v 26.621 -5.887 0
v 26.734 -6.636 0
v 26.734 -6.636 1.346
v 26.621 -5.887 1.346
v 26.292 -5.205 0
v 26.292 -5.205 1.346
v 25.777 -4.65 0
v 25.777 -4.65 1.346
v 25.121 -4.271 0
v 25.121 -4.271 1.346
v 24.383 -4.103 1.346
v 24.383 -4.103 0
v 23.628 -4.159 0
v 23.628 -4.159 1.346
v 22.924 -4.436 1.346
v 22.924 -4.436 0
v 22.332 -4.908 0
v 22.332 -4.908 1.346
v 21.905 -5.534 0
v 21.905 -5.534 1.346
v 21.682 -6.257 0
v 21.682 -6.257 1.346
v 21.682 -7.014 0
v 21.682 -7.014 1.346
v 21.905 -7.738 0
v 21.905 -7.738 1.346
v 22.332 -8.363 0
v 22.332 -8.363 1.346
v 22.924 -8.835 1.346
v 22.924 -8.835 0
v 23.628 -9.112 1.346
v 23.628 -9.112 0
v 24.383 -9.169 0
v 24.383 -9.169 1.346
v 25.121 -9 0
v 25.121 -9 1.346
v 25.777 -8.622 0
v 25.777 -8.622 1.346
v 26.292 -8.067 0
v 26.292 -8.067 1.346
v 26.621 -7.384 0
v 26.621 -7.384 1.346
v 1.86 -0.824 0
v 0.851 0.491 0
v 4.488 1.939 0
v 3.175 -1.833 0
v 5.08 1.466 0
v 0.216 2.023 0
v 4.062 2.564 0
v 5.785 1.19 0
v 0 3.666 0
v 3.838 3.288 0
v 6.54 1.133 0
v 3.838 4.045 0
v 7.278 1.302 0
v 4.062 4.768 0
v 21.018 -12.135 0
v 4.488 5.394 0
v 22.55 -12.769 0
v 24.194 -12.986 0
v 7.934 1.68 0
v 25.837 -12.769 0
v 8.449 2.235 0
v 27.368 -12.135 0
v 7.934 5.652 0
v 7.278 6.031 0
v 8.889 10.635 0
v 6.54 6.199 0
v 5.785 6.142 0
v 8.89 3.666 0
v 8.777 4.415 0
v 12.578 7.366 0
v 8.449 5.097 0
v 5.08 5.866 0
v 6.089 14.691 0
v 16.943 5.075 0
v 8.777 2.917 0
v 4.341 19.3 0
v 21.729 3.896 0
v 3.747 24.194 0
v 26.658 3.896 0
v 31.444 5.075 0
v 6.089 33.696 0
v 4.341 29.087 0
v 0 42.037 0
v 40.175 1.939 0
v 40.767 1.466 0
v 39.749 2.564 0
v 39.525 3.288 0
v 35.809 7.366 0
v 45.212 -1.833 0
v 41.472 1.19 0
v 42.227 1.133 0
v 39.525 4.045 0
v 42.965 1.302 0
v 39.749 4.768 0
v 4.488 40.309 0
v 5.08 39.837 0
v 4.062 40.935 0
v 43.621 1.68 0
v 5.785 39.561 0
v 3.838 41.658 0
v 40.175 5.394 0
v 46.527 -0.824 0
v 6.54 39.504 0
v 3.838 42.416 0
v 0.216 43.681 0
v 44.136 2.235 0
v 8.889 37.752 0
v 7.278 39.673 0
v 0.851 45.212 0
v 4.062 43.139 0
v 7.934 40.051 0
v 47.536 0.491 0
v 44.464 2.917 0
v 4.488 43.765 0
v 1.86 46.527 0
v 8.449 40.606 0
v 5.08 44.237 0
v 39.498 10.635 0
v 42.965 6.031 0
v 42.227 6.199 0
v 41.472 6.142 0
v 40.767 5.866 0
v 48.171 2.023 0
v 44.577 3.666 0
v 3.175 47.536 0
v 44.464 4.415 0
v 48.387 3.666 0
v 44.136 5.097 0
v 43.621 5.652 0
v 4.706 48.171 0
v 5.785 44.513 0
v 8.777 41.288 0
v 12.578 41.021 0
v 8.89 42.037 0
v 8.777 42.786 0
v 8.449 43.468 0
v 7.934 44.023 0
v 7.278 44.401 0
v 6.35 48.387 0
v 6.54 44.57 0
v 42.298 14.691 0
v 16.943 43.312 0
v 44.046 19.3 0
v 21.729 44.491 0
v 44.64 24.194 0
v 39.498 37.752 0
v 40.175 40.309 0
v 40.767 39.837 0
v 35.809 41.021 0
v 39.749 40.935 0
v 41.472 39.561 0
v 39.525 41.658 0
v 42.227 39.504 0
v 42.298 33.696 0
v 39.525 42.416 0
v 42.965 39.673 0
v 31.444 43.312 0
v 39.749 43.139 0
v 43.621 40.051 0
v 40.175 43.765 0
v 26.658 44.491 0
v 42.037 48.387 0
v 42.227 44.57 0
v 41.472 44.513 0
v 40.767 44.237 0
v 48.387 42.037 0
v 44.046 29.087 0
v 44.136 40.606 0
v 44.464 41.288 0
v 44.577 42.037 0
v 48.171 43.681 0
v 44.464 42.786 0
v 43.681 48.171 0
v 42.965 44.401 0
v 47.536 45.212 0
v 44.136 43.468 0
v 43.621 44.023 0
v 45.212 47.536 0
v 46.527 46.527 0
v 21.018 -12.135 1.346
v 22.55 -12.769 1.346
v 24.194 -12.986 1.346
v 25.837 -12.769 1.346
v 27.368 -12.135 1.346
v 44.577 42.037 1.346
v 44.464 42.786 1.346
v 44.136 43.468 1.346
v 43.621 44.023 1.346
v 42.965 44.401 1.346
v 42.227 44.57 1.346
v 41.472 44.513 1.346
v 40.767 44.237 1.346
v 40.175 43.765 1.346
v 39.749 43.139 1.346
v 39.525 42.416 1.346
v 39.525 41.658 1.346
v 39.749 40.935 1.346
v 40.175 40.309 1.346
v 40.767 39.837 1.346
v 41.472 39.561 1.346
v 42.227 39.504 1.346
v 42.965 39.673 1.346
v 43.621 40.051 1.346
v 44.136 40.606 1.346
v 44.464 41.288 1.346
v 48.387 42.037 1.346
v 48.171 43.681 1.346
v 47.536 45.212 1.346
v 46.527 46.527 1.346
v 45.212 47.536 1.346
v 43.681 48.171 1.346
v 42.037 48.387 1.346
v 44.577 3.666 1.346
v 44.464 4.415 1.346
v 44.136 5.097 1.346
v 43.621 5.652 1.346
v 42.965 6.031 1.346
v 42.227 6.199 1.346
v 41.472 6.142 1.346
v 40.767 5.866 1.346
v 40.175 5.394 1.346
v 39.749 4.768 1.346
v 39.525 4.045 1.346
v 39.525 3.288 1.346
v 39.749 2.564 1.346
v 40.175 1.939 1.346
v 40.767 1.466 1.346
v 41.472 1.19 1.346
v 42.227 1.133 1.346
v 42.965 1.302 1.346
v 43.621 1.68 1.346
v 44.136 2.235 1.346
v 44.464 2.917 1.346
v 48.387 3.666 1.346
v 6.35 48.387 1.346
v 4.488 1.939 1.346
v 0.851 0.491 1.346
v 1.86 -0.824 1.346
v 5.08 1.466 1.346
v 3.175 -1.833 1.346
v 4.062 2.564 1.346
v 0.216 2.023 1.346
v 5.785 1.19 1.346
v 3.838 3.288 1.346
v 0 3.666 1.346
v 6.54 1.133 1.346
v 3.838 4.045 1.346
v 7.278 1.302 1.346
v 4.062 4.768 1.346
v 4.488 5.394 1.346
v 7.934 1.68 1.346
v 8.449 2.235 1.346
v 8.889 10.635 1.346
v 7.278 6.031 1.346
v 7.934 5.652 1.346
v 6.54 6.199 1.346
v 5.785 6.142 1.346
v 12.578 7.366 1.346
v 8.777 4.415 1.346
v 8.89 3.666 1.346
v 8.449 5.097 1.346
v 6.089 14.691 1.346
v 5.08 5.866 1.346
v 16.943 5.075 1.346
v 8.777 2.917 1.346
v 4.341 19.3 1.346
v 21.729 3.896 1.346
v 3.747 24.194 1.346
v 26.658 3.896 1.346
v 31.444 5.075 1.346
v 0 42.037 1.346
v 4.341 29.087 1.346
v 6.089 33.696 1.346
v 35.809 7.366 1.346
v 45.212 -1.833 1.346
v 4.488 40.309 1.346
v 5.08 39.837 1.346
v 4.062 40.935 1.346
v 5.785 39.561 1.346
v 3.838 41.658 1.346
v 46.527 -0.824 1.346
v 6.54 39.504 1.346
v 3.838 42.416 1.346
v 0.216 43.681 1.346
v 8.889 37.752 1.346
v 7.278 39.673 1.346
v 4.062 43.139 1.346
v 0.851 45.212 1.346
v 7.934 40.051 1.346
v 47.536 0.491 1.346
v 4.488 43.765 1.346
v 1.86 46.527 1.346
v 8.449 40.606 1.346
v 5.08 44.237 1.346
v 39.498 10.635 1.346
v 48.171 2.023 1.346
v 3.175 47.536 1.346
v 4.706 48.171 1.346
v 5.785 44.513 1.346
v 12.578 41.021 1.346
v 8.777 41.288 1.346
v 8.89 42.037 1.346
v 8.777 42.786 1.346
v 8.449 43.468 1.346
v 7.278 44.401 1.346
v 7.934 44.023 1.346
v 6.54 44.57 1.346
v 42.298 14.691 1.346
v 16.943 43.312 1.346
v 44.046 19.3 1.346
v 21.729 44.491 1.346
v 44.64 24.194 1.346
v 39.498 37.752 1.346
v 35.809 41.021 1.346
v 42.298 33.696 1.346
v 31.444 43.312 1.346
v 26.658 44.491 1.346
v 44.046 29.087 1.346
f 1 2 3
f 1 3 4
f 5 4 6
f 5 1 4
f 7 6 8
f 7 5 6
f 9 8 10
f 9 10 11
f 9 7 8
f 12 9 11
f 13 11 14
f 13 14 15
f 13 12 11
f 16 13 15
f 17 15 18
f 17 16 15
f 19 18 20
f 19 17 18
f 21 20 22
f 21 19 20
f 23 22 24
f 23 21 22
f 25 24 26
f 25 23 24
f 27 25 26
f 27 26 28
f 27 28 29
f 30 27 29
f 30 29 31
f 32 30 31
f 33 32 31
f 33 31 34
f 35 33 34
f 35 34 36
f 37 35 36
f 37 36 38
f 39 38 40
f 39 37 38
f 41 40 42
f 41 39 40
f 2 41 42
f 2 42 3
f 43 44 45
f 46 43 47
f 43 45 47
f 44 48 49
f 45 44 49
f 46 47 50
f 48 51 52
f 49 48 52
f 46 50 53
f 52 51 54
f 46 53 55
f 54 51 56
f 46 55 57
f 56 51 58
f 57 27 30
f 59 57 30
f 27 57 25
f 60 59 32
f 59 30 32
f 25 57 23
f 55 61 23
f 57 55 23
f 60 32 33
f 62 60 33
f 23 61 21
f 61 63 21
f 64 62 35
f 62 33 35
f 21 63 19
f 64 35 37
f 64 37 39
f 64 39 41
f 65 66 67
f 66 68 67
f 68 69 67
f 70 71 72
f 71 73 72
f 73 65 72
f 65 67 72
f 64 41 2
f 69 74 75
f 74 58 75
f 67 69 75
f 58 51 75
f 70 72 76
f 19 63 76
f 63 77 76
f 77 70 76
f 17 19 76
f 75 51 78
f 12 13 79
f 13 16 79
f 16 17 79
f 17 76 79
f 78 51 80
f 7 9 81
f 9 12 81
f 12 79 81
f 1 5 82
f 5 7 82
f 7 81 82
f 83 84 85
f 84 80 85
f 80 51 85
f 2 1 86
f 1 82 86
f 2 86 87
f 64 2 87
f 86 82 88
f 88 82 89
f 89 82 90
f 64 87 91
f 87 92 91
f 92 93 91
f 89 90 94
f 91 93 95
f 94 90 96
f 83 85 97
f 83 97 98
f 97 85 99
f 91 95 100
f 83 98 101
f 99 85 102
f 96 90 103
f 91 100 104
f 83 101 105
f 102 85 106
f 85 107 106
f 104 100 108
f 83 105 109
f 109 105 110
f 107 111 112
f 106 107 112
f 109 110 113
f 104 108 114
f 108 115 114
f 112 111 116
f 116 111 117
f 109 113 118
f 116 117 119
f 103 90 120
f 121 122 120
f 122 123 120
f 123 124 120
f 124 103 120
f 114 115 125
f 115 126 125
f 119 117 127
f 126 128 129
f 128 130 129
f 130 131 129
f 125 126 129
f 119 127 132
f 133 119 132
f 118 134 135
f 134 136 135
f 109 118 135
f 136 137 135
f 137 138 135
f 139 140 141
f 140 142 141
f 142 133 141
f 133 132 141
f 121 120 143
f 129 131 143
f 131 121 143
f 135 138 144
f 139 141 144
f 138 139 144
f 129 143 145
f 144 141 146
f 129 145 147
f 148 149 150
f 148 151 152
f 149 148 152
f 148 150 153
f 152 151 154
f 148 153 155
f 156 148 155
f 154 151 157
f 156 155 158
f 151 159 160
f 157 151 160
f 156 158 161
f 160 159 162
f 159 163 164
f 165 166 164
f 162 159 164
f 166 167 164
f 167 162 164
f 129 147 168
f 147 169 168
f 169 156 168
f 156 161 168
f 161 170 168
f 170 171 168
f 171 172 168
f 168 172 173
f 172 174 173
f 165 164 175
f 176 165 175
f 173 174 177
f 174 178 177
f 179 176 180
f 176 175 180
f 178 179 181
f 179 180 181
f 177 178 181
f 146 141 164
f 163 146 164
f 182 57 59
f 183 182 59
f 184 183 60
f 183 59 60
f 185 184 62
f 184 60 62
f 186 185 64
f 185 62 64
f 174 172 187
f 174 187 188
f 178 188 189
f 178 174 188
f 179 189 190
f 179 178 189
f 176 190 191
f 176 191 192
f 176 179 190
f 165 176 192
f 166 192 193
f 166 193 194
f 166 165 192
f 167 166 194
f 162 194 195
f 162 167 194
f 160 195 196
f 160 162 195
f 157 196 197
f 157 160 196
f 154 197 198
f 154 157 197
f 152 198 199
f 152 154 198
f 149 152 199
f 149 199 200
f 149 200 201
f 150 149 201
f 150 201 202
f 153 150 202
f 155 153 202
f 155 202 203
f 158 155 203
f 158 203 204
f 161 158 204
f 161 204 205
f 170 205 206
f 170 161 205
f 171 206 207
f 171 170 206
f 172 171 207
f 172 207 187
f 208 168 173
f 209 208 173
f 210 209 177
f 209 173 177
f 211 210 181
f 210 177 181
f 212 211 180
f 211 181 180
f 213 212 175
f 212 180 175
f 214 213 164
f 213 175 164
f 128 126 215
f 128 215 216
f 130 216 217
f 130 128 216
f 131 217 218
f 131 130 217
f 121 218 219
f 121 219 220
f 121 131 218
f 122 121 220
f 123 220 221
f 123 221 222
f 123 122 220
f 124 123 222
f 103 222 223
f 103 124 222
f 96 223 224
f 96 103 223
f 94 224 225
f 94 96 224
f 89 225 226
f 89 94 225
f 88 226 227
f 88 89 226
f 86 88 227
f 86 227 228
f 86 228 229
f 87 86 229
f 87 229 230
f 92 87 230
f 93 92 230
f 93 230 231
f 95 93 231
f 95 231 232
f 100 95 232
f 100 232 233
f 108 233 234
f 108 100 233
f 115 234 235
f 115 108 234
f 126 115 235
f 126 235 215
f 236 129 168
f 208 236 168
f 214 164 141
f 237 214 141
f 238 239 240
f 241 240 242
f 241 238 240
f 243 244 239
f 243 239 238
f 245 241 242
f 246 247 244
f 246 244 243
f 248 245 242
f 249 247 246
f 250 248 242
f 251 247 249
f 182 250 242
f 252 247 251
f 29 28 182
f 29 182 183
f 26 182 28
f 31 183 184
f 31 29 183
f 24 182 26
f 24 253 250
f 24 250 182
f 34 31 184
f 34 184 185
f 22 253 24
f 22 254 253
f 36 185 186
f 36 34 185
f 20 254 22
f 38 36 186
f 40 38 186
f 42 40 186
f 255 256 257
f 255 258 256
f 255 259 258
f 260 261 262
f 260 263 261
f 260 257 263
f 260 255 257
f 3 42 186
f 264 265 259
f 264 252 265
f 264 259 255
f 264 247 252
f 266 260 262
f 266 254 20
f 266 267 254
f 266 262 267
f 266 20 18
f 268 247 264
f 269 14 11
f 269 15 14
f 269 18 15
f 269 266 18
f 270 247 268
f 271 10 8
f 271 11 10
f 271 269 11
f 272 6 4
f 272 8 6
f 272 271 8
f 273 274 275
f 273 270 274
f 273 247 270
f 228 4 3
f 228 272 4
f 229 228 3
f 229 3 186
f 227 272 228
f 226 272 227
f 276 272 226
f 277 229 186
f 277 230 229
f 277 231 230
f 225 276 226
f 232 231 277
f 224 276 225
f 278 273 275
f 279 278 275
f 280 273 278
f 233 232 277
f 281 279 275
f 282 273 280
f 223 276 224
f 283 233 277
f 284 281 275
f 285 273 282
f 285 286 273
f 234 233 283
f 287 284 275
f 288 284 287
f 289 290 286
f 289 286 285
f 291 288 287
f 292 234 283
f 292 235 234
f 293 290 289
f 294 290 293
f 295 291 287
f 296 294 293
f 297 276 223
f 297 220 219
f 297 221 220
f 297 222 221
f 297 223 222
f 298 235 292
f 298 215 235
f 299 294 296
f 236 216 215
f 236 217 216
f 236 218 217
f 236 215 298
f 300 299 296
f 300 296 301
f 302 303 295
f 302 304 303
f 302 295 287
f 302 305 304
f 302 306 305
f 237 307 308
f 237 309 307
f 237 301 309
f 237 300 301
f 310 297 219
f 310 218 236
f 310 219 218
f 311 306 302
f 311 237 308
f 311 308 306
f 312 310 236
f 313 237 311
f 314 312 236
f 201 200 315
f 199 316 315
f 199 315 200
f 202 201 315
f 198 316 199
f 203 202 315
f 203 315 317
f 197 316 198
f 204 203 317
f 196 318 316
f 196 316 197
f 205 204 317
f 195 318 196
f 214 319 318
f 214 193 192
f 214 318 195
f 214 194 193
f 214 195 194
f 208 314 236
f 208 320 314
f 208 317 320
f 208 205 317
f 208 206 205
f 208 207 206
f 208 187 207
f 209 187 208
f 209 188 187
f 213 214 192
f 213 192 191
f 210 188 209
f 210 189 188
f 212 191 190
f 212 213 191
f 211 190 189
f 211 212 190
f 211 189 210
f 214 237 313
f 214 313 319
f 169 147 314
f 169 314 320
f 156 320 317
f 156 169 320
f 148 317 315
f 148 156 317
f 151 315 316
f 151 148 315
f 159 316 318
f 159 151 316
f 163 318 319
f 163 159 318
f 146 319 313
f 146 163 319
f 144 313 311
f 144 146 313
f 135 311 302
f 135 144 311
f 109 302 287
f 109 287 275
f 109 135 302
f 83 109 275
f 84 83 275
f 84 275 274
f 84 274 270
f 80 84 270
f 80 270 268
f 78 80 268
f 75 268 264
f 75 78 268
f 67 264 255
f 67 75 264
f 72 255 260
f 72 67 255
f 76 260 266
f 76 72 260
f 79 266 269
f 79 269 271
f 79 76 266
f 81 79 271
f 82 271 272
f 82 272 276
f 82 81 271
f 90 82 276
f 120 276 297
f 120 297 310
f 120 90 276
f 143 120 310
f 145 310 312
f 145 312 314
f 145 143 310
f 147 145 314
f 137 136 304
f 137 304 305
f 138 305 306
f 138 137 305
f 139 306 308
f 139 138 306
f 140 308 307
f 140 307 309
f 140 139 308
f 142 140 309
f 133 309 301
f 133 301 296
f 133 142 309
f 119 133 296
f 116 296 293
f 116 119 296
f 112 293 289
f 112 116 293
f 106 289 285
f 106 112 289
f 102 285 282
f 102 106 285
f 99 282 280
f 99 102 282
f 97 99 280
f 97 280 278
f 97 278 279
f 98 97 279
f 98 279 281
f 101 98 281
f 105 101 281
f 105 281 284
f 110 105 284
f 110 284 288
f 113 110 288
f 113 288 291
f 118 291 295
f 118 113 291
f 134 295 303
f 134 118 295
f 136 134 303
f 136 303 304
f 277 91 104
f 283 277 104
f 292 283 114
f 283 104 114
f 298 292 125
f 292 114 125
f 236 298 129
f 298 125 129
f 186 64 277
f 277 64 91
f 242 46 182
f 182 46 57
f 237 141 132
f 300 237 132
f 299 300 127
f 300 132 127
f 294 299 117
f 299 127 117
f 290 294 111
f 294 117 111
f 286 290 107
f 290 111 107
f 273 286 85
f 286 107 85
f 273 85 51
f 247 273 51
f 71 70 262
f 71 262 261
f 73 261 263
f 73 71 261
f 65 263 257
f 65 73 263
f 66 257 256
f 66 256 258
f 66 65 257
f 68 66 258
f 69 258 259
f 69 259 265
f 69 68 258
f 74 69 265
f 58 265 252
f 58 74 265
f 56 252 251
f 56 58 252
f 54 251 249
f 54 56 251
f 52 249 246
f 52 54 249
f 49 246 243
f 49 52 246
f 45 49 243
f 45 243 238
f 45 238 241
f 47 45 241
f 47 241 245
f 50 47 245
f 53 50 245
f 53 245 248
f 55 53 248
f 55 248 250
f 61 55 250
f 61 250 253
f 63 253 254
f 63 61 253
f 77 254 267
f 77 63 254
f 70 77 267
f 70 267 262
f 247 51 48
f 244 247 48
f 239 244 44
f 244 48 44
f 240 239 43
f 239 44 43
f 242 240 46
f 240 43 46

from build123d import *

# Parameters (mm, degrees)
SKETCH1_R           = 2.54
SKETCH1_R_2         = 20.447
BOSS_EXTRUDE1_DEPTH = 1.3462


with BuildPart() as part:
    # Sketch1 → Boss-Extrude1 (new body)
    with BuildSketch(Plane.XY):
        with BuildLine():
            Line((48.387, 3.666174209), (48.387, 42.037))
            ThreePointArc((48.387, 42.037), (46.527128061, 46.527128061), (42.037, 48.387))
            Line((42.037, 48.387), (6.35, 48.387))
            ThreePointArc((6.35, 48.387), (1.859871939, 46.527128061), (0, 42.037))
            Line((0, 42.037), (0, 3.666174209))
            ThreePointArc((0, 3.666174209), (0.850738686, 0.491174209), (3.175, -1.833087105))
            Line((3.175, -1.833087105), (21.0185, -12.135036633))
            ThreePointArc((21.0185, -12.135036633), (24.1935, -12.985775319), (27.3685, -12.135036633))
            Line((27.3685, -12.135036633), (45.212, -1.833087105))
            ThreePointArc((45.212, -1.833087105), (47.536261314, 0.491174209), (48.387, 3.666174209))
        make_face()
        with Locations((6.35, 42.037)):
            Circle(SKETCH1_R, mode=Mode.SUBTRACT)
        with Locations((42.037, 42.037)):
            Circle(SKETCH1_R, mode=Mode.SUBTRACT)
        with Locations((42.037, 3.666174209)):
            Circle(SKETCH1_R, mode=Mode.SUBTRACT)
        with Locations((6.35, 3.666174209)):
            Circle(SKETCH1_R, mode=Mode.SUBTRACT)
        with Locations((24.1935, -6.635775319)):
            Circle(SKETCH1_R, mode=Mode.SUBTRACT)
        with Locations((24.1935, 24.1935)):
            Circle(SKETCH1_R_2, mode=Mode.SUBTRACT)
    extrude(amount=BOSS_EXTRUDE1_DEPTH)


solid = part.part
